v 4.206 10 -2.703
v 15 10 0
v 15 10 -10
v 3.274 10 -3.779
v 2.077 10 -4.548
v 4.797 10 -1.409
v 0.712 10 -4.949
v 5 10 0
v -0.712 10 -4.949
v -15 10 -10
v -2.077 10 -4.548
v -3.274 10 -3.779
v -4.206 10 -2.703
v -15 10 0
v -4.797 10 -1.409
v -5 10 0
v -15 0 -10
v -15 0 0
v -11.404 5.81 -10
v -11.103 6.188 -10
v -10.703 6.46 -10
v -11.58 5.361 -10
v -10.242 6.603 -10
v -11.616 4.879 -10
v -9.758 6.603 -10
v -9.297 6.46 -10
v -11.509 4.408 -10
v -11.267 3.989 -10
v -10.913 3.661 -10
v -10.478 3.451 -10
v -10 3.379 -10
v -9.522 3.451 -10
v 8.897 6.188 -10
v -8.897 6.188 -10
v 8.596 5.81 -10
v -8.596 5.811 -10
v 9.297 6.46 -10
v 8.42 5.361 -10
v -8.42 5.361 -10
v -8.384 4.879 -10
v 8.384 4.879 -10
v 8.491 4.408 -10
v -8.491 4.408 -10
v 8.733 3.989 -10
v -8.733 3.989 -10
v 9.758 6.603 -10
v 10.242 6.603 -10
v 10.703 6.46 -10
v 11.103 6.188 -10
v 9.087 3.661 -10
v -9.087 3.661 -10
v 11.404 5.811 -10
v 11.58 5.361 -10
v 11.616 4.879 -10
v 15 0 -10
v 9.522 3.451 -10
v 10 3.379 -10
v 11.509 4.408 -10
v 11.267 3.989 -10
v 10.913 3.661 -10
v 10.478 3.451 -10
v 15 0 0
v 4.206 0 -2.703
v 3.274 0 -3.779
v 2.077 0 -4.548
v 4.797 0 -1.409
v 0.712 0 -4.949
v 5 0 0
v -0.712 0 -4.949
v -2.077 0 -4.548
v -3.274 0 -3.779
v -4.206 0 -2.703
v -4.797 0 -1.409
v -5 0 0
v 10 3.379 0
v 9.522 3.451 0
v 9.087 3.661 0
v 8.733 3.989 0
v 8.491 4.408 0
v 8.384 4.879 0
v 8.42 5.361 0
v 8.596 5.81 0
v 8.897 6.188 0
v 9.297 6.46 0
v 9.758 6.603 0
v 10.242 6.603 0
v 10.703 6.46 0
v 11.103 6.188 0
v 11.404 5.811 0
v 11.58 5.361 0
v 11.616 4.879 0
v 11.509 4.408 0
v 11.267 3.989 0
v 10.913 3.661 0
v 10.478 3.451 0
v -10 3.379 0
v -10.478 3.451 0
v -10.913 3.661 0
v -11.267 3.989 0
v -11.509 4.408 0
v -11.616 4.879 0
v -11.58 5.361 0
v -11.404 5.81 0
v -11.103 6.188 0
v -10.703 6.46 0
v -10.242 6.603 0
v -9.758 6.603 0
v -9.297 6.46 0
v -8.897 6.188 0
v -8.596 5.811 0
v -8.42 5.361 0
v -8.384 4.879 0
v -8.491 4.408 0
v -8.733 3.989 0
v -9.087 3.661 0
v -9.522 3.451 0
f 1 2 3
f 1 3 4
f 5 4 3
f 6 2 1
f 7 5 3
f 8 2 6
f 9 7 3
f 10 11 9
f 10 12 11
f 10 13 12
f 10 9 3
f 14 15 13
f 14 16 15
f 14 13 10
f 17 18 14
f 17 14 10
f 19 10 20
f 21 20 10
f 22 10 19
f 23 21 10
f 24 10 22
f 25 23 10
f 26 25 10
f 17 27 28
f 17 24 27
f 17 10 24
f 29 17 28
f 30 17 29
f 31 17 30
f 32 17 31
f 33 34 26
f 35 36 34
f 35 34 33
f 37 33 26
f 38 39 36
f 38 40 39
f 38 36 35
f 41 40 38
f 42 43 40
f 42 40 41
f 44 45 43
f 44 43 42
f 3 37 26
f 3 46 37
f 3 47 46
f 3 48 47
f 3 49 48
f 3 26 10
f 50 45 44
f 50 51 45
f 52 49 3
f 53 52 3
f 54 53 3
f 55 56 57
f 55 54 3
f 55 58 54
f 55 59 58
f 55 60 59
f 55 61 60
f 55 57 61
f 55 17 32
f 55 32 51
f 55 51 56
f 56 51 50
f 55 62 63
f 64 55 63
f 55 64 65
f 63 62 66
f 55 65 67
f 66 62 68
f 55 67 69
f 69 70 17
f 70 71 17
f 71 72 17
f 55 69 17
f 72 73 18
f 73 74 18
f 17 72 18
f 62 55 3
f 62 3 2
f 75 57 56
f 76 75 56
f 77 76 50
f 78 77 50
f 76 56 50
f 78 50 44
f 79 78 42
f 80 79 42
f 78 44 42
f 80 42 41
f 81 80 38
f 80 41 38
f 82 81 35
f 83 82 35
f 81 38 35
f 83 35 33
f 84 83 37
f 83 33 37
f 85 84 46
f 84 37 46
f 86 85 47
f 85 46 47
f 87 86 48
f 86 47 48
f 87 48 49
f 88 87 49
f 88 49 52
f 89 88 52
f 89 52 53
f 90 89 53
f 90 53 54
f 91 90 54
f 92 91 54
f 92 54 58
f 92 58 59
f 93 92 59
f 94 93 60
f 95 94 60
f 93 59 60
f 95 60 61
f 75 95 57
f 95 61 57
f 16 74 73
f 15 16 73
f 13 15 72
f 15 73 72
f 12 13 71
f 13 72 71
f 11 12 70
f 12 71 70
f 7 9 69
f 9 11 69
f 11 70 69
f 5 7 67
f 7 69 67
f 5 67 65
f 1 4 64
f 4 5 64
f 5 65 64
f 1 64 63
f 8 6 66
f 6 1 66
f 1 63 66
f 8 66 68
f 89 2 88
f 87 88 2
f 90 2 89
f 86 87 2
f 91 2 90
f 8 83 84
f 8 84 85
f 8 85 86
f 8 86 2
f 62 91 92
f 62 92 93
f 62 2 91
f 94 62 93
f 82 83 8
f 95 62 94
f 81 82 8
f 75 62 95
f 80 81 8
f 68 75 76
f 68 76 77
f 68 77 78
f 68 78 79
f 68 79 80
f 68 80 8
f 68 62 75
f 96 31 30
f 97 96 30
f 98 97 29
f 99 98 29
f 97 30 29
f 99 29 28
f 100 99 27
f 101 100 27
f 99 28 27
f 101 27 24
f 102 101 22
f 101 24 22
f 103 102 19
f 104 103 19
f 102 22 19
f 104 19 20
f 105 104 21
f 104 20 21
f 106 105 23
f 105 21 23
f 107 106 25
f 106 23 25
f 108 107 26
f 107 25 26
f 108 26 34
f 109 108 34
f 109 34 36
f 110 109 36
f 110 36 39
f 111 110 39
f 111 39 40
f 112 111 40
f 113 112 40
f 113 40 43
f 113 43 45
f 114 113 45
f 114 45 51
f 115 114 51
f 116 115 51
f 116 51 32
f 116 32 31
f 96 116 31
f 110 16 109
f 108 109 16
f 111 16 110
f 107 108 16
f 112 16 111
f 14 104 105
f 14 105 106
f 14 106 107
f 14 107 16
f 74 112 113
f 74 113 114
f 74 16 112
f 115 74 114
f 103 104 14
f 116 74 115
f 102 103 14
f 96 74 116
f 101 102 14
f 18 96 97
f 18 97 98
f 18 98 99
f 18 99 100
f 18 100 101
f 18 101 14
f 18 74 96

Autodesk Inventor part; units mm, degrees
ref_plane "YZ Plane" through (0, 0, 0) normal (1, 0, 0) x (0, 1, 0)
ref_plane "XZ Plane" through (0, 0, 0) normal (0, 1, 0) x (-1, 0, 0)
ref_plane "XY Plane" through (0, 0, 0) normal (0, 0, 1) x (1, 0, 0)
sketch "Sketch2" plane through (0, 0, 0) normal (0, 1, 0) x (-1, 0, 0)
  line L0 (5, 0) -> (15, 0)
  line L1 (15, 0) -> (15, -10)
  line L2 (15, -10) -> (-15, -10)
  line L3 (-15, -10) -> (-15, 0)
  line L4 (-15, 0) -> (-5, 0)
  arc A0 (-5, 0) -> (5, 0) centre (0, 0) ccw
  dimension "d0" = 10
  dimension "d1" = 5
  dimension "d12" = 10
extrude "Extrusion1" add sketch "Sketch2" along normal blind 10
sketch "Sketch3" plane through (0, 0, 0) normal (0, 0, 1) x (1, 0, 0)
  line L0 (5, 0) -> (15, 0) construction
  line L1 (15, 0) -> (15, 10) construction
  line L2 (5, 10) -> (15, 10) construction
  line L3 (5, 0) -> (5, 10) construction
  line L4 (-15, 0) -> (-5, 0) construction
  line L5 (-5, 0) -> (-5, 10) construction
  line L6 (-15, 10) -> (-5, 10) construction
  line L7 (-15, 0) -> (-15, 10) construction
  line L8 (15, 10) -> (5, 0) construction
  line L9 (5, 10) -> (15, 0) construction
  line L10 (-5, 0) -> (-15, 10) construction
  line L11 (-5, 10) -> (-15, 0) construction
  point P0 (0, 0)
  point P1 (-10, 5)
  point P2 (10, 5)
hole "Hole1" at (-10, 5, 0) at (10, 5, 0) direction (0, 0, -1) diameter 3.242 end through all thread size "M4x0.7" class "6H" standard "ISO Metric profile"
properties part number "P014-Chapeau_bielle"
